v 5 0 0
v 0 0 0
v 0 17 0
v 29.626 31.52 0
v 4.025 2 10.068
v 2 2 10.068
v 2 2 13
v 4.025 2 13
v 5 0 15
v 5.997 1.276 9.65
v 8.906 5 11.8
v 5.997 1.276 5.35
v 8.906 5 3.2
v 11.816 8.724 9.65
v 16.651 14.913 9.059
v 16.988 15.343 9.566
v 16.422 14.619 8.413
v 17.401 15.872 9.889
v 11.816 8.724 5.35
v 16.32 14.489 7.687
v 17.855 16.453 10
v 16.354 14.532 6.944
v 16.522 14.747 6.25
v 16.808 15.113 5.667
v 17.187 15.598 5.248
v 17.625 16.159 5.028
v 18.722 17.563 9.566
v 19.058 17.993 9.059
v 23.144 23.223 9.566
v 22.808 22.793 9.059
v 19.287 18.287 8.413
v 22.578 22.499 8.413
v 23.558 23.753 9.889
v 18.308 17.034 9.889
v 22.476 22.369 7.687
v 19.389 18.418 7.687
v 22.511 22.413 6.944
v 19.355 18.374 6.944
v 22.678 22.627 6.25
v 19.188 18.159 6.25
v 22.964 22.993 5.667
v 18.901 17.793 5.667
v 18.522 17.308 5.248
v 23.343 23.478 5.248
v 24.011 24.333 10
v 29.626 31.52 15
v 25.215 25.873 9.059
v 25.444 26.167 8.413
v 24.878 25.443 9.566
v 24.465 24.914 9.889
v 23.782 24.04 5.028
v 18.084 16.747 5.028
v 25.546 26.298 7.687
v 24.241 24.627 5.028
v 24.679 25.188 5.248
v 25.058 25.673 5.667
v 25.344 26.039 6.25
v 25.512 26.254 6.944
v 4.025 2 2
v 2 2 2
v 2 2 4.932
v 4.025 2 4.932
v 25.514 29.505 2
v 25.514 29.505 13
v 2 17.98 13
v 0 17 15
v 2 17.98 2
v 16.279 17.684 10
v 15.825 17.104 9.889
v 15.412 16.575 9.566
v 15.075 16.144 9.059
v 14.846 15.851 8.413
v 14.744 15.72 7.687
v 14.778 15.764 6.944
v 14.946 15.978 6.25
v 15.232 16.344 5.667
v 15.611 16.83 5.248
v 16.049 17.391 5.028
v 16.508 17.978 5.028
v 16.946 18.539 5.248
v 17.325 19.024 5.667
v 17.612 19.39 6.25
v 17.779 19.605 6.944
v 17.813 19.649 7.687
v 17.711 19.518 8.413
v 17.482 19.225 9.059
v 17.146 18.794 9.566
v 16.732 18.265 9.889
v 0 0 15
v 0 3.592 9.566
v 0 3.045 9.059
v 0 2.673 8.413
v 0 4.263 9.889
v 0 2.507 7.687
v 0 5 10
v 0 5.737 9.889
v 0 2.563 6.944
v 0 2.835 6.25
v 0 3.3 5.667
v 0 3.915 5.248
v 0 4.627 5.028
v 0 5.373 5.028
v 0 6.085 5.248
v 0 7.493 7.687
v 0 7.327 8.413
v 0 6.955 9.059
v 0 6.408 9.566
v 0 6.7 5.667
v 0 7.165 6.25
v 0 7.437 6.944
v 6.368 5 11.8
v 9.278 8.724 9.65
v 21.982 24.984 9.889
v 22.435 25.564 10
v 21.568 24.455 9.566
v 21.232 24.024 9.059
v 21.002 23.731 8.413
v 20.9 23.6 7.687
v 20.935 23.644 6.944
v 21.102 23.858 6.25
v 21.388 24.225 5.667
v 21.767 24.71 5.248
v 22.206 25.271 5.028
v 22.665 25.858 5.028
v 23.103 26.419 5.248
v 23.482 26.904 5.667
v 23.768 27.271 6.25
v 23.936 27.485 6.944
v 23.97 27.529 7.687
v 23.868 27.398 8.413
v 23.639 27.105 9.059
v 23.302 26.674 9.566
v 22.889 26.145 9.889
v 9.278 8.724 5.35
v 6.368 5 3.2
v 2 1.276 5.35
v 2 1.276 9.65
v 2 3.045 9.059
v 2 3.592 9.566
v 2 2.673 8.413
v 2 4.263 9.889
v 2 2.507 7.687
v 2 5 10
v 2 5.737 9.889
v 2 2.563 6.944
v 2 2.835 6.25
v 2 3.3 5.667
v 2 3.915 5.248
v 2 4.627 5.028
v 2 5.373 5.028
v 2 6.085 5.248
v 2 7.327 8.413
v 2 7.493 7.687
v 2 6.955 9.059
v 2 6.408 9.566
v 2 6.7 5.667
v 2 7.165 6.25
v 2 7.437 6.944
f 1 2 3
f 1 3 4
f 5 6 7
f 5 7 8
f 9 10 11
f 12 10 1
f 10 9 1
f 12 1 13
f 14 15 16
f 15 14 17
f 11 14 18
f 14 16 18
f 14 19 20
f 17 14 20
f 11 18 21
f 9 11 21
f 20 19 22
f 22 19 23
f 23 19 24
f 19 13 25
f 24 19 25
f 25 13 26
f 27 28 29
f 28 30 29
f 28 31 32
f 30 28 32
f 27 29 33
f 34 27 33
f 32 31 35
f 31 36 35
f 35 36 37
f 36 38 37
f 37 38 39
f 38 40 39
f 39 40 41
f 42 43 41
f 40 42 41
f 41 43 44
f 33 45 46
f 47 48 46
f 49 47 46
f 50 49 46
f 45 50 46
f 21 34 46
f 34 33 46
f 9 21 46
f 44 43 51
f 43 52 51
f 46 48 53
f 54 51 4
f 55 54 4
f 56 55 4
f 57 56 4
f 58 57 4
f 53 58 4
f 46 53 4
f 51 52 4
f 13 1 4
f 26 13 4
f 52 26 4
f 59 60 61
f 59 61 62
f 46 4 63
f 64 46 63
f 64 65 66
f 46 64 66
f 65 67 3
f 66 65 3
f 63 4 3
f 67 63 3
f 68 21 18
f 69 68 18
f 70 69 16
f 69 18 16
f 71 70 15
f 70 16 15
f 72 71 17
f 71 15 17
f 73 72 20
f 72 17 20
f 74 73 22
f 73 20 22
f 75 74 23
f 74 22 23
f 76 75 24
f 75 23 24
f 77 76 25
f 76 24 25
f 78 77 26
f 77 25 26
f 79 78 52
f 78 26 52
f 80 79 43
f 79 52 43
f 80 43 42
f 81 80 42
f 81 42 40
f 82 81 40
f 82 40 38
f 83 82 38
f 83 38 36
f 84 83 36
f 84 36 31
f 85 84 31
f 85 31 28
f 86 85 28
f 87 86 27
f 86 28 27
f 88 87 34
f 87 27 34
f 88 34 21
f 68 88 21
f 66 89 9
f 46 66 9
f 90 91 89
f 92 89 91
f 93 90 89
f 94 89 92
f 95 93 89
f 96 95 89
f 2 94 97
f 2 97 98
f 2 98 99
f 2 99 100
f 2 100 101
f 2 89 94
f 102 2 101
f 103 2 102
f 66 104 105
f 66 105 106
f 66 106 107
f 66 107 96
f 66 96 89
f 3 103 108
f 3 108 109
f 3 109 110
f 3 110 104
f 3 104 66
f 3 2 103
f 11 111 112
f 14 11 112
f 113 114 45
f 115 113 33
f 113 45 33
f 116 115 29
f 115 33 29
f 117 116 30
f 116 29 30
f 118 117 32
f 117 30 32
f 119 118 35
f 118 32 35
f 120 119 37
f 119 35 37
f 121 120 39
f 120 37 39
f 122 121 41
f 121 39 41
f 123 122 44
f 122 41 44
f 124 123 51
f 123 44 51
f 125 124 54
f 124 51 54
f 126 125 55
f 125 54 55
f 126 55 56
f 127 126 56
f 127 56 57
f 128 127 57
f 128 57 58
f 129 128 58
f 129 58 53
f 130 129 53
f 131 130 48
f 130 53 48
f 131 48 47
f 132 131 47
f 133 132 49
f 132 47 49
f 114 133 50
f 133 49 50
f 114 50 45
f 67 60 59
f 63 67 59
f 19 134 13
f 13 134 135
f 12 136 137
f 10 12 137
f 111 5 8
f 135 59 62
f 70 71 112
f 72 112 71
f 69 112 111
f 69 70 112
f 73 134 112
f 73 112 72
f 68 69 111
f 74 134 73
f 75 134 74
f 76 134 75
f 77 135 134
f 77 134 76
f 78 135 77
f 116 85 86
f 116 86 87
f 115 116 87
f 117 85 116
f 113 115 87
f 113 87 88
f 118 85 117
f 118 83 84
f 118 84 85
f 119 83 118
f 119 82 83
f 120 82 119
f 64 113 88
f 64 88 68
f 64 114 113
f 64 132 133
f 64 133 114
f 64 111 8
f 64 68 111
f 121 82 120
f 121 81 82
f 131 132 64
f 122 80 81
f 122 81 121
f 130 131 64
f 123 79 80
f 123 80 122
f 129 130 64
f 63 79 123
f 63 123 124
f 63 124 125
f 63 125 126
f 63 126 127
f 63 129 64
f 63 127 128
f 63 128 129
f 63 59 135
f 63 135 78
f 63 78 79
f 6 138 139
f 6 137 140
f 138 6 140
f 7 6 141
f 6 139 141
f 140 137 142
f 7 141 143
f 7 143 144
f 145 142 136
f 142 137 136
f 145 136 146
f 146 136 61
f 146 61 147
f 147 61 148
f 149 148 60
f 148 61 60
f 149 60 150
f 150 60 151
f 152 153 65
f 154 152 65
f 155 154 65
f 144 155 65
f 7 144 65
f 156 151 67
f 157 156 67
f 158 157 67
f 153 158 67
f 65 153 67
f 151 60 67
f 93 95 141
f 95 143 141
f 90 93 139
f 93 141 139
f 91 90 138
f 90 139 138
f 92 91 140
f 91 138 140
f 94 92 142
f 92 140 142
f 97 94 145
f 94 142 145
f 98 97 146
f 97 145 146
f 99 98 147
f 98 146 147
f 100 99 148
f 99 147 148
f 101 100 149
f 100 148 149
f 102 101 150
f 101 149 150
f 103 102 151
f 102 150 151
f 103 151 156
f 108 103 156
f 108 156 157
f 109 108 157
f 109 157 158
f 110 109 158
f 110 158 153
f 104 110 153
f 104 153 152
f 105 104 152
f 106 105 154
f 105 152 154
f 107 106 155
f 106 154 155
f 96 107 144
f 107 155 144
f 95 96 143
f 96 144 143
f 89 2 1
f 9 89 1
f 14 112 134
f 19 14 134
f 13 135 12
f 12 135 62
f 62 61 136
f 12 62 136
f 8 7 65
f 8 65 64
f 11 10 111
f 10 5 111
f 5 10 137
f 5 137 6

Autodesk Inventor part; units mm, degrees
ref_plane "YZ Plane" through (0, 0, 0) normal (1, 0, 0) x (0, 1, 0)
ref_plane "XZ Plane" through (0, 0, 0) normal (0, 1, 0) x (-1, 0, 0)
ref_plane "XY Plane" through (0, 0, 0) normal (0, 0, 1) x (1, 0, 0)
sketch "Skizze1" plane through (0, 0, 0) normal (0, 0, 1) x (1, 0, 0)
  line L0 (0, 0) -> (0, 17)
  line L1 (0, 0) -> (40, 0) construction
  line L2 (0, 0) -> (5, 0)
  line L3 (5, 0) -> (29.6265, 31.5204)
  line L4 (29.6265, 31.5204) -> (0, 17)
  dimension "d0" = 17
  dimension "d46" = 5
  dimension "d48" = 40
extrude "Extrusion1" add sketch "Skizze1" along normal blind 15
hole "Bohrung1" at (0, 5, 7.5) direction (1, 0, 0) diameter 5 end through all
shell "Wandstärke3" thickness 2 removed faces 2 at (9.8755, 21.8401, 5) at (3.6198, 7.5, 7.5084)
sketch "Skizze5" plane through (2, 2, 2) normal (1, 0, 0) x (0, 0, -1)
  circle A0 centre (-5.5, 3) radius 2.5 projected
  line L0 (-3.35, -0.7239) -> (-7.65, -0.7239)
  line L1 (-7.65, -0.7239) -> (-9.8, 3)
  line L2 (-9.8, 3) -> (-7.65, 6.7239)
  line L3 (-7.65, 6.7239) -> (-3.35, 6.7239)
  line L4 (-3.35, 6.7239) -> (-1.2, 3)
  line L5 (-1.2, 3) -> (-3.35, -0.7239)
  point P0 (2, -2)
  dimension "d71" = 4.3
extrude "Extrusion4" cut sketch "Skizze5" along normal blind 10
hole "Bohrung6" at (22.4352, 25.5645, 7.5) direction (0.7880108, -0.6156615, 0) diameter 5 end through all
hole "Bohrung7" at (16.2786, 17.6844, 7.5) direction (0.7880108, -0.6156615, 0) diameter 5 end through all
properties part number "Befestigung"
